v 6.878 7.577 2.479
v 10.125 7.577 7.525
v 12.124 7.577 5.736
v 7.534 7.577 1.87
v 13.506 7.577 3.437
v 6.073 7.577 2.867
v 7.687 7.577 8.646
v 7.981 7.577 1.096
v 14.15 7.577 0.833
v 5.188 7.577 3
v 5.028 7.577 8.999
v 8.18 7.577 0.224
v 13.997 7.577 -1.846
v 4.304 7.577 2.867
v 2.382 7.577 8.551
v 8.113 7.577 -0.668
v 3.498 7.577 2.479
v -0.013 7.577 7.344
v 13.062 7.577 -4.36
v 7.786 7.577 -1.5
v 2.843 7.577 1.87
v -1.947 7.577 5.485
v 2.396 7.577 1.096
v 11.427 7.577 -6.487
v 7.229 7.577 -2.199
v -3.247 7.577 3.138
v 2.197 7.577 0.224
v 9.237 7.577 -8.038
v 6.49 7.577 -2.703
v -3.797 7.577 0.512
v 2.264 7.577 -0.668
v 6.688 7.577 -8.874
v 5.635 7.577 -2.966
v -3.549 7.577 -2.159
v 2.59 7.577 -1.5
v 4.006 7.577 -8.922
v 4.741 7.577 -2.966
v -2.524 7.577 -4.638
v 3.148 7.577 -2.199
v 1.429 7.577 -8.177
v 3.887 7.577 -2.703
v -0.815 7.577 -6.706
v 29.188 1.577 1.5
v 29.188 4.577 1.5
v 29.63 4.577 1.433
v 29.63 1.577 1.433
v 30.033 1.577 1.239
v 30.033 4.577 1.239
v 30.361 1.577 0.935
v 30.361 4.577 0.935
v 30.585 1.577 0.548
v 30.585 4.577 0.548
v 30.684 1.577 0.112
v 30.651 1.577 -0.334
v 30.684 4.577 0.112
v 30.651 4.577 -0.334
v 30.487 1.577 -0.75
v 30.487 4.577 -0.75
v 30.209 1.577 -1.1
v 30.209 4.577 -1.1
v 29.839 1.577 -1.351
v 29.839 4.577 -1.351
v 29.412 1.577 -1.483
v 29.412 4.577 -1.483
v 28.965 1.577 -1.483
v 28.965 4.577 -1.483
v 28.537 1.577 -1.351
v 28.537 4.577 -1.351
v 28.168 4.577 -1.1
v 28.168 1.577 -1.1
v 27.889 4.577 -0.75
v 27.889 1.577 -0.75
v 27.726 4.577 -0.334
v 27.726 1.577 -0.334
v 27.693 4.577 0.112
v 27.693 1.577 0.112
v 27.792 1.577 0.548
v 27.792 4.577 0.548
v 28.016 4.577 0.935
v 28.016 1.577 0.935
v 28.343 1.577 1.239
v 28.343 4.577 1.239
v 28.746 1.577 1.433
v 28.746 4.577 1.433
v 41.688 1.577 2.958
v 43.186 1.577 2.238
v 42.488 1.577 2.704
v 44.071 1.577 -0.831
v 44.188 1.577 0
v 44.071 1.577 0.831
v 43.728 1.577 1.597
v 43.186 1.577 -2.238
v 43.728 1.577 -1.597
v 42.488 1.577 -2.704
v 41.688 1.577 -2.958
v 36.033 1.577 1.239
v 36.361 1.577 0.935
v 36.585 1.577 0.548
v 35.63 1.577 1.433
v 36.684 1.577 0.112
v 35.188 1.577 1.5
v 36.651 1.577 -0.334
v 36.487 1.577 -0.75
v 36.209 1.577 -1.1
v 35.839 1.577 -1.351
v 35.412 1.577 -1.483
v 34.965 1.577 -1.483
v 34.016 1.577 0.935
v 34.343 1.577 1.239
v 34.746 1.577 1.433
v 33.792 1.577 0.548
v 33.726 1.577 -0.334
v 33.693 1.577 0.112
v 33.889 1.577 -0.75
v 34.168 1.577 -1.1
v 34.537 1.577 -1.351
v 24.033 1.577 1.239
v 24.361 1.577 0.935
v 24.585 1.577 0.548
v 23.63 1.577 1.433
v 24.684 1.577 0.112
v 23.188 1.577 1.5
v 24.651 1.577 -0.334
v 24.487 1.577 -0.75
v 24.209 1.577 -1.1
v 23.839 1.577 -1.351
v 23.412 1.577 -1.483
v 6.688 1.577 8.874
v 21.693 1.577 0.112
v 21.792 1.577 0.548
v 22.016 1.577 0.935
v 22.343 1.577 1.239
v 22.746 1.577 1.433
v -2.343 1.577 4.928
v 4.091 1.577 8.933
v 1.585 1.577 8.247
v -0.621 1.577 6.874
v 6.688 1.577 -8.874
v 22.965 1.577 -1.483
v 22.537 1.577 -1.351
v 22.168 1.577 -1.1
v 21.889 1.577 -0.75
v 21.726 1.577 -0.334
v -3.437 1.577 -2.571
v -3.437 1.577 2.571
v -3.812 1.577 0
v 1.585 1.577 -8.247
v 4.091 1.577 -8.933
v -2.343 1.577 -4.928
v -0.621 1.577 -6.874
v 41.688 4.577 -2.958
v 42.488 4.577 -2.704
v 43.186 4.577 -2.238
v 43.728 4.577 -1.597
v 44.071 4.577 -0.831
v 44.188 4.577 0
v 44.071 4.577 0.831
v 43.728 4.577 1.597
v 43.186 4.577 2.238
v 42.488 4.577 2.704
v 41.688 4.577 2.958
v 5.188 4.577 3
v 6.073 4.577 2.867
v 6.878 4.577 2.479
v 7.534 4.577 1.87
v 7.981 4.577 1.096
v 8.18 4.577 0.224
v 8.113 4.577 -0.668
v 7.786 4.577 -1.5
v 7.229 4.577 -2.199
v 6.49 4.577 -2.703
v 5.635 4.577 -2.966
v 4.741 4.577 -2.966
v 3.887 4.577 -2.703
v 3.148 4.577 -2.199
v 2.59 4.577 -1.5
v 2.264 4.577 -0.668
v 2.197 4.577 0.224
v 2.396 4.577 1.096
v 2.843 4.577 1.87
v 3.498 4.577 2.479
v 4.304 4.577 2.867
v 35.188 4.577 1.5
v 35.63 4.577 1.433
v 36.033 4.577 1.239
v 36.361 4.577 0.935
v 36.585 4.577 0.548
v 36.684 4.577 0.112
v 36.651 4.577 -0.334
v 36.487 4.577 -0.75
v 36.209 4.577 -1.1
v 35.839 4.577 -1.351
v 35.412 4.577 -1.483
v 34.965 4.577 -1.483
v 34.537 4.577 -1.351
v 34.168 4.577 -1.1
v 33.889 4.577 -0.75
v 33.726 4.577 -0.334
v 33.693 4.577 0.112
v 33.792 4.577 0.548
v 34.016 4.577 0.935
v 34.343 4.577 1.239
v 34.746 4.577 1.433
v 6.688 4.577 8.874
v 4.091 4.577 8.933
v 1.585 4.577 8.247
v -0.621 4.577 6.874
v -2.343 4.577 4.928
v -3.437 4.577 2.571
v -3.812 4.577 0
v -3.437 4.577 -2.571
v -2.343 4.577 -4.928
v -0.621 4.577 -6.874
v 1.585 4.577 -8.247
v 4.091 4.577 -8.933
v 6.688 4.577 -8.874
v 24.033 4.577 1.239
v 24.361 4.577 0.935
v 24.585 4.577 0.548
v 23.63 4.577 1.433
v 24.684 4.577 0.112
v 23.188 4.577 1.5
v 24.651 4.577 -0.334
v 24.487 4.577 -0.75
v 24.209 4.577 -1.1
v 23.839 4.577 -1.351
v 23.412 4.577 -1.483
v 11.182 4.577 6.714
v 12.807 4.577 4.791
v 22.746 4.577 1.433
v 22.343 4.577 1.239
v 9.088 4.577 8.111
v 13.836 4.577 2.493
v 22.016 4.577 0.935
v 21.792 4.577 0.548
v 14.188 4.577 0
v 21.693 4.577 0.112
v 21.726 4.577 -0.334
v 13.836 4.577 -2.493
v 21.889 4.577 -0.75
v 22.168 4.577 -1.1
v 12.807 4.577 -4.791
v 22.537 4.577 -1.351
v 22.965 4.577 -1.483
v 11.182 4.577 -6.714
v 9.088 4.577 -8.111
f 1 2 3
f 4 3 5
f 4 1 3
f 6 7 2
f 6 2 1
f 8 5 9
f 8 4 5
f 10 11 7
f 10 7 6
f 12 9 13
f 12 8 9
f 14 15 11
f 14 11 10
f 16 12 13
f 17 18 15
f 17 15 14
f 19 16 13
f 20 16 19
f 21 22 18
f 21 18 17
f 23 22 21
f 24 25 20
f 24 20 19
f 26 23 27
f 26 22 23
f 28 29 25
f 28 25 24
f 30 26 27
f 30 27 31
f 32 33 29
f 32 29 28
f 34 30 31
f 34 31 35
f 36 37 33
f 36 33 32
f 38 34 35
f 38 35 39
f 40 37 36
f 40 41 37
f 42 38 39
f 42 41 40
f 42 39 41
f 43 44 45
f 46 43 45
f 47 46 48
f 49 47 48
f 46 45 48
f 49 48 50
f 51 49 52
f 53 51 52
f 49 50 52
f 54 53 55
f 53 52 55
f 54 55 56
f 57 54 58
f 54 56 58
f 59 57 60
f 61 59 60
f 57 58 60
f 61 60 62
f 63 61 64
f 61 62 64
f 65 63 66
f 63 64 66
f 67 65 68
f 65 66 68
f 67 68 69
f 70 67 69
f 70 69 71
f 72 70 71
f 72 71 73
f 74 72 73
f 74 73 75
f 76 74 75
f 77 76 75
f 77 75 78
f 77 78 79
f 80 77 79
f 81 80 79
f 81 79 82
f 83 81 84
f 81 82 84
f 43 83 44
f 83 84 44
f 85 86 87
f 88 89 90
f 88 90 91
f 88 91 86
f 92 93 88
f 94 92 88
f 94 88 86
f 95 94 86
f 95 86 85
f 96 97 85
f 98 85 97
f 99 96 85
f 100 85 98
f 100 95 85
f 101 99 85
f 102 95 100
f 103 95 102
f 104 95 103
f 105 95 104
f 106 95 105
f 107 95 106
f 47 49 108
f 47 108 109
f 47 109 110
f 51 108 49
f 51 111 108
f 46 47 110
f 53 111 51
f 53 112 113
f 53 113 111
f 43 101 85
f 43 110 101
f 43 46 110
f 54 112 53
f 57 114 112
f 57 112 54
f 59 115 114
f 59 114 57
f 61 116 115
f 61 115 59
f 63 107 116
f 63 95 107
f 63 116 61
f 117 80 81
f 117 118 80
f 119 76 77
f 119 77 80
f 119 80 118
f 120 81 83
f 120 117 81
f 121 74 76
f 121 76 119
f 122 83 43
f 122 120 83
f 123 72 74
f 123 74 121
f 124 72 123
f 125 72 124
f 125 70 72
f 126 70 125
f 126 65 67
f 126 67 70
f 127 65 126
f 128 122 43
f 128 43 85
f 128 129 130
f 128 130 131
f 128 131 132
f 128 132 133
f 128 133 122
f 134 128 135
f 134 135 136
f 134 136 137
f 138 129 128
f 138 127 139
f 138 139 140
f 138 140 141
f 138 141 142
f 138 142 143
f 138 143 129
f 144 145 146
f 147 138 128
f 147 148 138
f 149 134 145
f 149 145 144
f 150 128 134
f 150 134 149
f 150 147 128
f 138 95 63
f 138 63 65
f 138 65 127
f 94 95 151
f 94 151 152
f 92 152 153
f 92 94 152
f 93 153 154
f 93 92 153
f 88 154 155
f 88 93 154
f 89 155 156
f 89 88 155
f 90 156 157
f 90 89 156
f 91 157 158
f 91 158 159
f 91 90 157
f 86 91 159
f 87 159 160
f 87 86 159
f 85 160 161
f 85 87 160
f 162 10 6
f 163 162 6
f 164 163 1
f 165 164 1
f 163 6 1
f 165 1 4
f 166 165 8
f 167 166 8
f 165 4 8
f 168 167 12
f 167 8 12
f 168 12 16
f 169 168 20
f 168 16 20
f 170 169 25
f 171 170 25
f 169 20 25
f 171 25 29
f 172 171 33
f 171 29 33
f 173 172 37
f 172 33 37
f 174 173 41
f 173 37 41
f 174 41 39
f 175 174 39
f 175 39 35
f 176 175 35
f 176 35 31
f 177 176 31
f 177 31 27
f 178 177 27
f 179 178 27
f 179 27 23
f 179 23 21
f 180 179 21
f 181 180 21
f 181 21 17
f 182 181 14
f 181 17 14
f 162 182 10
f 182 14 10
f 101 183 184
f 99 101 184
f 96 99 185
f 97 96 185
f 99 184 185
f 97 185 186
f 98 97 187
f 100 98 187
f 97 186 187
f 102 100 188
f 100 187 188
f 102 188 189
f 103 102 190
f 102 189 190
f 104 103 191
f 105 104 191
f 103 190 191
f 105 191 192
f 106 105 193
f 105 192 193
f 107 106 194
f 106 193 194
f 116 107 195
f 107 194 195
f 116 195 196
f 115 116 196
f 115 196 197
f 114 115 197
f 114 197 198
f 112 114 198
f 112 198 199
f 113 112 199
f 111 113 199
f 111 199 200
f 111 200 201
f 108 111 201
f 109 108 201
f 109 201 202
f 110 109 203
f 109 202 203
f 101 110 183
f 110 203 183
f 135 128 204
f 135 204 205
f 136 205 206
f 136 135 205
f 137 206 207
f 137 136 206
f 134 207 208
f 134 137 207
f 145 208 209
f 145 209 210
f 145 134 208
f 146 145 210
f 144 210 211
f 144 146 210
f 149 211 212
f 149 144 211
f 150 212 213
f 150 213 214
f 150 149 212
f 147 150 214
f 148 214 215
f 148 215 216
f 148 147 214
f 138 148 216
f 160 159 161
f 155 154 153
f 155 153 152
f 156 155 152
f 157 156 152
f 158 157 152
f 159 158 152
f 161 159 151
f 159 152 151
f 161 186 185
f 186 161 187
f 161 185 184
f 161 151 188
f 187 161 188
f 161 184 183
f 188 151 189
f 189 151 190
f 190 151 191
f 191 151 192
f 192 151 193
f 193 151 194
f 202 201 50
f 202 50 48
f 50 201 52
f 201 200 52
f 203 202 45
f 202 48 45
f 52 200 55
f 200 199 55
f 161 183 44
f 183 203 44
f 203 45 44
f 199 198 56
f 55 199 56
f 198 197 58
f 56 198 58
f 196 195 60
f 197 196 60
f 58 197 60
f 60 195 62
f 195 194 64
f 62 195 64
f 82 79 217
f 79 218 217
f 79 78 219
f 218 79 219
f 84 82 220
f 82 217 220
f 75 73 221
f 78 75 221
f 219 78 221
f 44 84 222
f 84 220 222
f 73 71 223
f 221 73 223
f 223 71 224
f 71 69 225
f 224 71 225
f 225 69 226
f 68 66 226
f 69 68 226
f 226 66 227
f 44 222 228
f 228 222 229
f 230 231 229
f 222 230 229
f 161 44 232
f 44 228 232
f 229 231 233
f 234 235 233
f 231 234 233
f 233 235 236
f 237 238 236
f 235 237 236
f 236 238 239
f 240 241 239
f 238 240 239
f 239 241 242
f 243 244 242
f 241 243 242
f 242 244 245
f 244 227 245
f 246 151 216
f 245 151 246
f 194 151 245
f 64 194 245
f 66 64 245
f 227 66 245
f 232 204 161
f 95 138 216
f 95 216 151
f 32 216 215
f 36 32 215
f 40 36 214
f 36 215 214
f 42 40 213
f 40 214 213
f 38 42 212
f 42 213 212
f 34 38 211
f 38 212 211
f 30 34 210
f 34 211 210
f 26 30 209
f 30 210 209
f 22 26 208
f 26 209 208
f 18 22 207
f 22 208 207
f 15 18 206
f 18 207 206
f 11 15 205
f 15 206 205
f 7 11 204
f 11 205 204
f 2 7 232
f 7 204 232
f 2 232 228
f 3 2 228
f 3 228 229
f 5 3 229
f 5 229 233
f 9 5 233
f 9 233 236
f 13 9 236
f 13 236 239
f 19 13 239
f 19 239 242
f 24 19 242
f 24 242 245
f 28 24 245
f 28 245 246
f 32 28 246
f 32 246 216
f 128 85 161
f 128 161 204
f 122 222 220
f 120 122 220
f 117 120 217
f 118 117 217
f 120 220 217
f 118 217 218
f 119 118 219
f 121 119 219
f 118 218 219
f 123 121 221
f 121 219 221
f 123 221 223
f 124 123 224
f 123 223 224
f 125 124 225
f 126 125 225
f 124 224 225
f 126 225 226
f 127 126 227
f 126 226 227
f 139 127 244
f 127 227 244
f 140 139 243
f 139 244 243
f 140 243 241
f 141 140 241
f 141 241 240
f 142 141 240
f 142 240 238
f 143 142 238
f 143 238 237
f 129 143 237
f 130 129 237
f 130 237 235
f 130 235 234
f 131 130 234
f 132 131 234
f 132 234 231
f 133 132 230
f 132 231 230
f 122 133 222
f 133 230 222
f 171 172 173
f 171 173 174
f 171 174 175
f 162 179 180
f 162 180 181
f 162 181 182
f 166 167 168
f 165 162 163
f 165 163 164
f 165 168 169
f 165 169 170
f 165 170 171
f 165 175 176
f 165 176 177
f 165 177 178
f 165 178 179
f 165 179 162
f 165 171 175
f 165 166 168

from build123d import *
from build123d.topology import SkipClean

# Parameters (mm, degrees)
BOSS_EXTRUDE1_DEPTH = 5
SKETCH2_R           = 15
BOSS_EXTRUDE2_DEPTH = 5
SKETCH3_R           = 5
CUT_EXTRUDE1_DEPTH  = 5
SKETCH4_R           = 2.5
CUT_EXTRUDE2_DEPTH  = 5
SCALE1_SCALE        = 0.6


with BuildPart() as part:
    # Sketch1 → Boss-Extrude1 (new body)
    with BuildSketch(Plane(origin=(0, 0, 0), x_dir=(1, 0, 0), z_dir=(0, 1, 0))):
        with BuildLine():
            Line((2.5, 14.790199458), (60.833333333, 4.930066486))
            ThreePointArc((60.833333333, 4.930066486), (65, 0), (60.833333333, -4.930066486))
            Line((60.833333333, -4.930066486), (2.5, -14.790199458))
            ThreePointArc((2.5, -14.790199458), (-15, 0), (2.5, 14.790199458))
        make_face()
    extrude(amount=BOSS_EXTRUDE1_DEPTH)

    # Sketch2 → Boss-Extrude2 (add)
    with SkipClean():  # the faces are left unmerged after this step: merging them gives an invalid solid
        with BuildSketch(Plane(origin=(0, 5, 0), x_dir=(1, 0, 0), z_dir=(0, 1, 0))):
            with Locations(Location((0, 0, 0), (0, 0, 80.405931773))):
                Circle(SKETCH2_R)
        extrude(amount=BOSS_EXTRUDE2_DEPTH)

    # Sketch3 → Cut-Extrude1 (cut)
    with SkipClean():  # the faces are left unmerged after this step: merging them gives an invalid solid
        with BuildSketch(Plane(origin=(0, 10, 0), x_dir=(1, 0, 0), z_dir=(0, 1, 0))):
            with Locations(Location((0, 0, 0), (0, 0, 270))):
                Circle(SKETCH3_R)
        extrude(amount=-CUT_EXTRUDE1_DEPTH, mode=Mode.SUBTRACT)

    # Sketch4 → Cut-Extrude2 (cut)
    with SkipClean():  # the faces are left unmerged after this step: merging them gives an invalid solid
        with BuildSketch(Plane(origin=(0, 5, 0), x_dir=(1, 0, 0), z_dir=(0, 1, 0))):
            with Locations(Location((50, 0, 0), (0, 0, 270))):
                Circle(SKETCH4_R)
            with Locations(Location((40, 0, 0), (0, 0, 270))):
                Circle(SKETCH4_R)
            with Locations(Location((30, 0, 0), (0, 0, 270))):
                Circle(SKETCH4_R)
        extrude(amount=-CUT_EXTRUDE2_DEPTH, mode=Mode.SUBTRACT)


with BuildPart() as part_1:
    # Scale1: scaled about (12.970813322, 3.941879124, 0)
    add(part.part.scale(SCALE1_SCALE).moved(Location((5.188325329, 1.57675165, 0))))


solid = part_1.part
